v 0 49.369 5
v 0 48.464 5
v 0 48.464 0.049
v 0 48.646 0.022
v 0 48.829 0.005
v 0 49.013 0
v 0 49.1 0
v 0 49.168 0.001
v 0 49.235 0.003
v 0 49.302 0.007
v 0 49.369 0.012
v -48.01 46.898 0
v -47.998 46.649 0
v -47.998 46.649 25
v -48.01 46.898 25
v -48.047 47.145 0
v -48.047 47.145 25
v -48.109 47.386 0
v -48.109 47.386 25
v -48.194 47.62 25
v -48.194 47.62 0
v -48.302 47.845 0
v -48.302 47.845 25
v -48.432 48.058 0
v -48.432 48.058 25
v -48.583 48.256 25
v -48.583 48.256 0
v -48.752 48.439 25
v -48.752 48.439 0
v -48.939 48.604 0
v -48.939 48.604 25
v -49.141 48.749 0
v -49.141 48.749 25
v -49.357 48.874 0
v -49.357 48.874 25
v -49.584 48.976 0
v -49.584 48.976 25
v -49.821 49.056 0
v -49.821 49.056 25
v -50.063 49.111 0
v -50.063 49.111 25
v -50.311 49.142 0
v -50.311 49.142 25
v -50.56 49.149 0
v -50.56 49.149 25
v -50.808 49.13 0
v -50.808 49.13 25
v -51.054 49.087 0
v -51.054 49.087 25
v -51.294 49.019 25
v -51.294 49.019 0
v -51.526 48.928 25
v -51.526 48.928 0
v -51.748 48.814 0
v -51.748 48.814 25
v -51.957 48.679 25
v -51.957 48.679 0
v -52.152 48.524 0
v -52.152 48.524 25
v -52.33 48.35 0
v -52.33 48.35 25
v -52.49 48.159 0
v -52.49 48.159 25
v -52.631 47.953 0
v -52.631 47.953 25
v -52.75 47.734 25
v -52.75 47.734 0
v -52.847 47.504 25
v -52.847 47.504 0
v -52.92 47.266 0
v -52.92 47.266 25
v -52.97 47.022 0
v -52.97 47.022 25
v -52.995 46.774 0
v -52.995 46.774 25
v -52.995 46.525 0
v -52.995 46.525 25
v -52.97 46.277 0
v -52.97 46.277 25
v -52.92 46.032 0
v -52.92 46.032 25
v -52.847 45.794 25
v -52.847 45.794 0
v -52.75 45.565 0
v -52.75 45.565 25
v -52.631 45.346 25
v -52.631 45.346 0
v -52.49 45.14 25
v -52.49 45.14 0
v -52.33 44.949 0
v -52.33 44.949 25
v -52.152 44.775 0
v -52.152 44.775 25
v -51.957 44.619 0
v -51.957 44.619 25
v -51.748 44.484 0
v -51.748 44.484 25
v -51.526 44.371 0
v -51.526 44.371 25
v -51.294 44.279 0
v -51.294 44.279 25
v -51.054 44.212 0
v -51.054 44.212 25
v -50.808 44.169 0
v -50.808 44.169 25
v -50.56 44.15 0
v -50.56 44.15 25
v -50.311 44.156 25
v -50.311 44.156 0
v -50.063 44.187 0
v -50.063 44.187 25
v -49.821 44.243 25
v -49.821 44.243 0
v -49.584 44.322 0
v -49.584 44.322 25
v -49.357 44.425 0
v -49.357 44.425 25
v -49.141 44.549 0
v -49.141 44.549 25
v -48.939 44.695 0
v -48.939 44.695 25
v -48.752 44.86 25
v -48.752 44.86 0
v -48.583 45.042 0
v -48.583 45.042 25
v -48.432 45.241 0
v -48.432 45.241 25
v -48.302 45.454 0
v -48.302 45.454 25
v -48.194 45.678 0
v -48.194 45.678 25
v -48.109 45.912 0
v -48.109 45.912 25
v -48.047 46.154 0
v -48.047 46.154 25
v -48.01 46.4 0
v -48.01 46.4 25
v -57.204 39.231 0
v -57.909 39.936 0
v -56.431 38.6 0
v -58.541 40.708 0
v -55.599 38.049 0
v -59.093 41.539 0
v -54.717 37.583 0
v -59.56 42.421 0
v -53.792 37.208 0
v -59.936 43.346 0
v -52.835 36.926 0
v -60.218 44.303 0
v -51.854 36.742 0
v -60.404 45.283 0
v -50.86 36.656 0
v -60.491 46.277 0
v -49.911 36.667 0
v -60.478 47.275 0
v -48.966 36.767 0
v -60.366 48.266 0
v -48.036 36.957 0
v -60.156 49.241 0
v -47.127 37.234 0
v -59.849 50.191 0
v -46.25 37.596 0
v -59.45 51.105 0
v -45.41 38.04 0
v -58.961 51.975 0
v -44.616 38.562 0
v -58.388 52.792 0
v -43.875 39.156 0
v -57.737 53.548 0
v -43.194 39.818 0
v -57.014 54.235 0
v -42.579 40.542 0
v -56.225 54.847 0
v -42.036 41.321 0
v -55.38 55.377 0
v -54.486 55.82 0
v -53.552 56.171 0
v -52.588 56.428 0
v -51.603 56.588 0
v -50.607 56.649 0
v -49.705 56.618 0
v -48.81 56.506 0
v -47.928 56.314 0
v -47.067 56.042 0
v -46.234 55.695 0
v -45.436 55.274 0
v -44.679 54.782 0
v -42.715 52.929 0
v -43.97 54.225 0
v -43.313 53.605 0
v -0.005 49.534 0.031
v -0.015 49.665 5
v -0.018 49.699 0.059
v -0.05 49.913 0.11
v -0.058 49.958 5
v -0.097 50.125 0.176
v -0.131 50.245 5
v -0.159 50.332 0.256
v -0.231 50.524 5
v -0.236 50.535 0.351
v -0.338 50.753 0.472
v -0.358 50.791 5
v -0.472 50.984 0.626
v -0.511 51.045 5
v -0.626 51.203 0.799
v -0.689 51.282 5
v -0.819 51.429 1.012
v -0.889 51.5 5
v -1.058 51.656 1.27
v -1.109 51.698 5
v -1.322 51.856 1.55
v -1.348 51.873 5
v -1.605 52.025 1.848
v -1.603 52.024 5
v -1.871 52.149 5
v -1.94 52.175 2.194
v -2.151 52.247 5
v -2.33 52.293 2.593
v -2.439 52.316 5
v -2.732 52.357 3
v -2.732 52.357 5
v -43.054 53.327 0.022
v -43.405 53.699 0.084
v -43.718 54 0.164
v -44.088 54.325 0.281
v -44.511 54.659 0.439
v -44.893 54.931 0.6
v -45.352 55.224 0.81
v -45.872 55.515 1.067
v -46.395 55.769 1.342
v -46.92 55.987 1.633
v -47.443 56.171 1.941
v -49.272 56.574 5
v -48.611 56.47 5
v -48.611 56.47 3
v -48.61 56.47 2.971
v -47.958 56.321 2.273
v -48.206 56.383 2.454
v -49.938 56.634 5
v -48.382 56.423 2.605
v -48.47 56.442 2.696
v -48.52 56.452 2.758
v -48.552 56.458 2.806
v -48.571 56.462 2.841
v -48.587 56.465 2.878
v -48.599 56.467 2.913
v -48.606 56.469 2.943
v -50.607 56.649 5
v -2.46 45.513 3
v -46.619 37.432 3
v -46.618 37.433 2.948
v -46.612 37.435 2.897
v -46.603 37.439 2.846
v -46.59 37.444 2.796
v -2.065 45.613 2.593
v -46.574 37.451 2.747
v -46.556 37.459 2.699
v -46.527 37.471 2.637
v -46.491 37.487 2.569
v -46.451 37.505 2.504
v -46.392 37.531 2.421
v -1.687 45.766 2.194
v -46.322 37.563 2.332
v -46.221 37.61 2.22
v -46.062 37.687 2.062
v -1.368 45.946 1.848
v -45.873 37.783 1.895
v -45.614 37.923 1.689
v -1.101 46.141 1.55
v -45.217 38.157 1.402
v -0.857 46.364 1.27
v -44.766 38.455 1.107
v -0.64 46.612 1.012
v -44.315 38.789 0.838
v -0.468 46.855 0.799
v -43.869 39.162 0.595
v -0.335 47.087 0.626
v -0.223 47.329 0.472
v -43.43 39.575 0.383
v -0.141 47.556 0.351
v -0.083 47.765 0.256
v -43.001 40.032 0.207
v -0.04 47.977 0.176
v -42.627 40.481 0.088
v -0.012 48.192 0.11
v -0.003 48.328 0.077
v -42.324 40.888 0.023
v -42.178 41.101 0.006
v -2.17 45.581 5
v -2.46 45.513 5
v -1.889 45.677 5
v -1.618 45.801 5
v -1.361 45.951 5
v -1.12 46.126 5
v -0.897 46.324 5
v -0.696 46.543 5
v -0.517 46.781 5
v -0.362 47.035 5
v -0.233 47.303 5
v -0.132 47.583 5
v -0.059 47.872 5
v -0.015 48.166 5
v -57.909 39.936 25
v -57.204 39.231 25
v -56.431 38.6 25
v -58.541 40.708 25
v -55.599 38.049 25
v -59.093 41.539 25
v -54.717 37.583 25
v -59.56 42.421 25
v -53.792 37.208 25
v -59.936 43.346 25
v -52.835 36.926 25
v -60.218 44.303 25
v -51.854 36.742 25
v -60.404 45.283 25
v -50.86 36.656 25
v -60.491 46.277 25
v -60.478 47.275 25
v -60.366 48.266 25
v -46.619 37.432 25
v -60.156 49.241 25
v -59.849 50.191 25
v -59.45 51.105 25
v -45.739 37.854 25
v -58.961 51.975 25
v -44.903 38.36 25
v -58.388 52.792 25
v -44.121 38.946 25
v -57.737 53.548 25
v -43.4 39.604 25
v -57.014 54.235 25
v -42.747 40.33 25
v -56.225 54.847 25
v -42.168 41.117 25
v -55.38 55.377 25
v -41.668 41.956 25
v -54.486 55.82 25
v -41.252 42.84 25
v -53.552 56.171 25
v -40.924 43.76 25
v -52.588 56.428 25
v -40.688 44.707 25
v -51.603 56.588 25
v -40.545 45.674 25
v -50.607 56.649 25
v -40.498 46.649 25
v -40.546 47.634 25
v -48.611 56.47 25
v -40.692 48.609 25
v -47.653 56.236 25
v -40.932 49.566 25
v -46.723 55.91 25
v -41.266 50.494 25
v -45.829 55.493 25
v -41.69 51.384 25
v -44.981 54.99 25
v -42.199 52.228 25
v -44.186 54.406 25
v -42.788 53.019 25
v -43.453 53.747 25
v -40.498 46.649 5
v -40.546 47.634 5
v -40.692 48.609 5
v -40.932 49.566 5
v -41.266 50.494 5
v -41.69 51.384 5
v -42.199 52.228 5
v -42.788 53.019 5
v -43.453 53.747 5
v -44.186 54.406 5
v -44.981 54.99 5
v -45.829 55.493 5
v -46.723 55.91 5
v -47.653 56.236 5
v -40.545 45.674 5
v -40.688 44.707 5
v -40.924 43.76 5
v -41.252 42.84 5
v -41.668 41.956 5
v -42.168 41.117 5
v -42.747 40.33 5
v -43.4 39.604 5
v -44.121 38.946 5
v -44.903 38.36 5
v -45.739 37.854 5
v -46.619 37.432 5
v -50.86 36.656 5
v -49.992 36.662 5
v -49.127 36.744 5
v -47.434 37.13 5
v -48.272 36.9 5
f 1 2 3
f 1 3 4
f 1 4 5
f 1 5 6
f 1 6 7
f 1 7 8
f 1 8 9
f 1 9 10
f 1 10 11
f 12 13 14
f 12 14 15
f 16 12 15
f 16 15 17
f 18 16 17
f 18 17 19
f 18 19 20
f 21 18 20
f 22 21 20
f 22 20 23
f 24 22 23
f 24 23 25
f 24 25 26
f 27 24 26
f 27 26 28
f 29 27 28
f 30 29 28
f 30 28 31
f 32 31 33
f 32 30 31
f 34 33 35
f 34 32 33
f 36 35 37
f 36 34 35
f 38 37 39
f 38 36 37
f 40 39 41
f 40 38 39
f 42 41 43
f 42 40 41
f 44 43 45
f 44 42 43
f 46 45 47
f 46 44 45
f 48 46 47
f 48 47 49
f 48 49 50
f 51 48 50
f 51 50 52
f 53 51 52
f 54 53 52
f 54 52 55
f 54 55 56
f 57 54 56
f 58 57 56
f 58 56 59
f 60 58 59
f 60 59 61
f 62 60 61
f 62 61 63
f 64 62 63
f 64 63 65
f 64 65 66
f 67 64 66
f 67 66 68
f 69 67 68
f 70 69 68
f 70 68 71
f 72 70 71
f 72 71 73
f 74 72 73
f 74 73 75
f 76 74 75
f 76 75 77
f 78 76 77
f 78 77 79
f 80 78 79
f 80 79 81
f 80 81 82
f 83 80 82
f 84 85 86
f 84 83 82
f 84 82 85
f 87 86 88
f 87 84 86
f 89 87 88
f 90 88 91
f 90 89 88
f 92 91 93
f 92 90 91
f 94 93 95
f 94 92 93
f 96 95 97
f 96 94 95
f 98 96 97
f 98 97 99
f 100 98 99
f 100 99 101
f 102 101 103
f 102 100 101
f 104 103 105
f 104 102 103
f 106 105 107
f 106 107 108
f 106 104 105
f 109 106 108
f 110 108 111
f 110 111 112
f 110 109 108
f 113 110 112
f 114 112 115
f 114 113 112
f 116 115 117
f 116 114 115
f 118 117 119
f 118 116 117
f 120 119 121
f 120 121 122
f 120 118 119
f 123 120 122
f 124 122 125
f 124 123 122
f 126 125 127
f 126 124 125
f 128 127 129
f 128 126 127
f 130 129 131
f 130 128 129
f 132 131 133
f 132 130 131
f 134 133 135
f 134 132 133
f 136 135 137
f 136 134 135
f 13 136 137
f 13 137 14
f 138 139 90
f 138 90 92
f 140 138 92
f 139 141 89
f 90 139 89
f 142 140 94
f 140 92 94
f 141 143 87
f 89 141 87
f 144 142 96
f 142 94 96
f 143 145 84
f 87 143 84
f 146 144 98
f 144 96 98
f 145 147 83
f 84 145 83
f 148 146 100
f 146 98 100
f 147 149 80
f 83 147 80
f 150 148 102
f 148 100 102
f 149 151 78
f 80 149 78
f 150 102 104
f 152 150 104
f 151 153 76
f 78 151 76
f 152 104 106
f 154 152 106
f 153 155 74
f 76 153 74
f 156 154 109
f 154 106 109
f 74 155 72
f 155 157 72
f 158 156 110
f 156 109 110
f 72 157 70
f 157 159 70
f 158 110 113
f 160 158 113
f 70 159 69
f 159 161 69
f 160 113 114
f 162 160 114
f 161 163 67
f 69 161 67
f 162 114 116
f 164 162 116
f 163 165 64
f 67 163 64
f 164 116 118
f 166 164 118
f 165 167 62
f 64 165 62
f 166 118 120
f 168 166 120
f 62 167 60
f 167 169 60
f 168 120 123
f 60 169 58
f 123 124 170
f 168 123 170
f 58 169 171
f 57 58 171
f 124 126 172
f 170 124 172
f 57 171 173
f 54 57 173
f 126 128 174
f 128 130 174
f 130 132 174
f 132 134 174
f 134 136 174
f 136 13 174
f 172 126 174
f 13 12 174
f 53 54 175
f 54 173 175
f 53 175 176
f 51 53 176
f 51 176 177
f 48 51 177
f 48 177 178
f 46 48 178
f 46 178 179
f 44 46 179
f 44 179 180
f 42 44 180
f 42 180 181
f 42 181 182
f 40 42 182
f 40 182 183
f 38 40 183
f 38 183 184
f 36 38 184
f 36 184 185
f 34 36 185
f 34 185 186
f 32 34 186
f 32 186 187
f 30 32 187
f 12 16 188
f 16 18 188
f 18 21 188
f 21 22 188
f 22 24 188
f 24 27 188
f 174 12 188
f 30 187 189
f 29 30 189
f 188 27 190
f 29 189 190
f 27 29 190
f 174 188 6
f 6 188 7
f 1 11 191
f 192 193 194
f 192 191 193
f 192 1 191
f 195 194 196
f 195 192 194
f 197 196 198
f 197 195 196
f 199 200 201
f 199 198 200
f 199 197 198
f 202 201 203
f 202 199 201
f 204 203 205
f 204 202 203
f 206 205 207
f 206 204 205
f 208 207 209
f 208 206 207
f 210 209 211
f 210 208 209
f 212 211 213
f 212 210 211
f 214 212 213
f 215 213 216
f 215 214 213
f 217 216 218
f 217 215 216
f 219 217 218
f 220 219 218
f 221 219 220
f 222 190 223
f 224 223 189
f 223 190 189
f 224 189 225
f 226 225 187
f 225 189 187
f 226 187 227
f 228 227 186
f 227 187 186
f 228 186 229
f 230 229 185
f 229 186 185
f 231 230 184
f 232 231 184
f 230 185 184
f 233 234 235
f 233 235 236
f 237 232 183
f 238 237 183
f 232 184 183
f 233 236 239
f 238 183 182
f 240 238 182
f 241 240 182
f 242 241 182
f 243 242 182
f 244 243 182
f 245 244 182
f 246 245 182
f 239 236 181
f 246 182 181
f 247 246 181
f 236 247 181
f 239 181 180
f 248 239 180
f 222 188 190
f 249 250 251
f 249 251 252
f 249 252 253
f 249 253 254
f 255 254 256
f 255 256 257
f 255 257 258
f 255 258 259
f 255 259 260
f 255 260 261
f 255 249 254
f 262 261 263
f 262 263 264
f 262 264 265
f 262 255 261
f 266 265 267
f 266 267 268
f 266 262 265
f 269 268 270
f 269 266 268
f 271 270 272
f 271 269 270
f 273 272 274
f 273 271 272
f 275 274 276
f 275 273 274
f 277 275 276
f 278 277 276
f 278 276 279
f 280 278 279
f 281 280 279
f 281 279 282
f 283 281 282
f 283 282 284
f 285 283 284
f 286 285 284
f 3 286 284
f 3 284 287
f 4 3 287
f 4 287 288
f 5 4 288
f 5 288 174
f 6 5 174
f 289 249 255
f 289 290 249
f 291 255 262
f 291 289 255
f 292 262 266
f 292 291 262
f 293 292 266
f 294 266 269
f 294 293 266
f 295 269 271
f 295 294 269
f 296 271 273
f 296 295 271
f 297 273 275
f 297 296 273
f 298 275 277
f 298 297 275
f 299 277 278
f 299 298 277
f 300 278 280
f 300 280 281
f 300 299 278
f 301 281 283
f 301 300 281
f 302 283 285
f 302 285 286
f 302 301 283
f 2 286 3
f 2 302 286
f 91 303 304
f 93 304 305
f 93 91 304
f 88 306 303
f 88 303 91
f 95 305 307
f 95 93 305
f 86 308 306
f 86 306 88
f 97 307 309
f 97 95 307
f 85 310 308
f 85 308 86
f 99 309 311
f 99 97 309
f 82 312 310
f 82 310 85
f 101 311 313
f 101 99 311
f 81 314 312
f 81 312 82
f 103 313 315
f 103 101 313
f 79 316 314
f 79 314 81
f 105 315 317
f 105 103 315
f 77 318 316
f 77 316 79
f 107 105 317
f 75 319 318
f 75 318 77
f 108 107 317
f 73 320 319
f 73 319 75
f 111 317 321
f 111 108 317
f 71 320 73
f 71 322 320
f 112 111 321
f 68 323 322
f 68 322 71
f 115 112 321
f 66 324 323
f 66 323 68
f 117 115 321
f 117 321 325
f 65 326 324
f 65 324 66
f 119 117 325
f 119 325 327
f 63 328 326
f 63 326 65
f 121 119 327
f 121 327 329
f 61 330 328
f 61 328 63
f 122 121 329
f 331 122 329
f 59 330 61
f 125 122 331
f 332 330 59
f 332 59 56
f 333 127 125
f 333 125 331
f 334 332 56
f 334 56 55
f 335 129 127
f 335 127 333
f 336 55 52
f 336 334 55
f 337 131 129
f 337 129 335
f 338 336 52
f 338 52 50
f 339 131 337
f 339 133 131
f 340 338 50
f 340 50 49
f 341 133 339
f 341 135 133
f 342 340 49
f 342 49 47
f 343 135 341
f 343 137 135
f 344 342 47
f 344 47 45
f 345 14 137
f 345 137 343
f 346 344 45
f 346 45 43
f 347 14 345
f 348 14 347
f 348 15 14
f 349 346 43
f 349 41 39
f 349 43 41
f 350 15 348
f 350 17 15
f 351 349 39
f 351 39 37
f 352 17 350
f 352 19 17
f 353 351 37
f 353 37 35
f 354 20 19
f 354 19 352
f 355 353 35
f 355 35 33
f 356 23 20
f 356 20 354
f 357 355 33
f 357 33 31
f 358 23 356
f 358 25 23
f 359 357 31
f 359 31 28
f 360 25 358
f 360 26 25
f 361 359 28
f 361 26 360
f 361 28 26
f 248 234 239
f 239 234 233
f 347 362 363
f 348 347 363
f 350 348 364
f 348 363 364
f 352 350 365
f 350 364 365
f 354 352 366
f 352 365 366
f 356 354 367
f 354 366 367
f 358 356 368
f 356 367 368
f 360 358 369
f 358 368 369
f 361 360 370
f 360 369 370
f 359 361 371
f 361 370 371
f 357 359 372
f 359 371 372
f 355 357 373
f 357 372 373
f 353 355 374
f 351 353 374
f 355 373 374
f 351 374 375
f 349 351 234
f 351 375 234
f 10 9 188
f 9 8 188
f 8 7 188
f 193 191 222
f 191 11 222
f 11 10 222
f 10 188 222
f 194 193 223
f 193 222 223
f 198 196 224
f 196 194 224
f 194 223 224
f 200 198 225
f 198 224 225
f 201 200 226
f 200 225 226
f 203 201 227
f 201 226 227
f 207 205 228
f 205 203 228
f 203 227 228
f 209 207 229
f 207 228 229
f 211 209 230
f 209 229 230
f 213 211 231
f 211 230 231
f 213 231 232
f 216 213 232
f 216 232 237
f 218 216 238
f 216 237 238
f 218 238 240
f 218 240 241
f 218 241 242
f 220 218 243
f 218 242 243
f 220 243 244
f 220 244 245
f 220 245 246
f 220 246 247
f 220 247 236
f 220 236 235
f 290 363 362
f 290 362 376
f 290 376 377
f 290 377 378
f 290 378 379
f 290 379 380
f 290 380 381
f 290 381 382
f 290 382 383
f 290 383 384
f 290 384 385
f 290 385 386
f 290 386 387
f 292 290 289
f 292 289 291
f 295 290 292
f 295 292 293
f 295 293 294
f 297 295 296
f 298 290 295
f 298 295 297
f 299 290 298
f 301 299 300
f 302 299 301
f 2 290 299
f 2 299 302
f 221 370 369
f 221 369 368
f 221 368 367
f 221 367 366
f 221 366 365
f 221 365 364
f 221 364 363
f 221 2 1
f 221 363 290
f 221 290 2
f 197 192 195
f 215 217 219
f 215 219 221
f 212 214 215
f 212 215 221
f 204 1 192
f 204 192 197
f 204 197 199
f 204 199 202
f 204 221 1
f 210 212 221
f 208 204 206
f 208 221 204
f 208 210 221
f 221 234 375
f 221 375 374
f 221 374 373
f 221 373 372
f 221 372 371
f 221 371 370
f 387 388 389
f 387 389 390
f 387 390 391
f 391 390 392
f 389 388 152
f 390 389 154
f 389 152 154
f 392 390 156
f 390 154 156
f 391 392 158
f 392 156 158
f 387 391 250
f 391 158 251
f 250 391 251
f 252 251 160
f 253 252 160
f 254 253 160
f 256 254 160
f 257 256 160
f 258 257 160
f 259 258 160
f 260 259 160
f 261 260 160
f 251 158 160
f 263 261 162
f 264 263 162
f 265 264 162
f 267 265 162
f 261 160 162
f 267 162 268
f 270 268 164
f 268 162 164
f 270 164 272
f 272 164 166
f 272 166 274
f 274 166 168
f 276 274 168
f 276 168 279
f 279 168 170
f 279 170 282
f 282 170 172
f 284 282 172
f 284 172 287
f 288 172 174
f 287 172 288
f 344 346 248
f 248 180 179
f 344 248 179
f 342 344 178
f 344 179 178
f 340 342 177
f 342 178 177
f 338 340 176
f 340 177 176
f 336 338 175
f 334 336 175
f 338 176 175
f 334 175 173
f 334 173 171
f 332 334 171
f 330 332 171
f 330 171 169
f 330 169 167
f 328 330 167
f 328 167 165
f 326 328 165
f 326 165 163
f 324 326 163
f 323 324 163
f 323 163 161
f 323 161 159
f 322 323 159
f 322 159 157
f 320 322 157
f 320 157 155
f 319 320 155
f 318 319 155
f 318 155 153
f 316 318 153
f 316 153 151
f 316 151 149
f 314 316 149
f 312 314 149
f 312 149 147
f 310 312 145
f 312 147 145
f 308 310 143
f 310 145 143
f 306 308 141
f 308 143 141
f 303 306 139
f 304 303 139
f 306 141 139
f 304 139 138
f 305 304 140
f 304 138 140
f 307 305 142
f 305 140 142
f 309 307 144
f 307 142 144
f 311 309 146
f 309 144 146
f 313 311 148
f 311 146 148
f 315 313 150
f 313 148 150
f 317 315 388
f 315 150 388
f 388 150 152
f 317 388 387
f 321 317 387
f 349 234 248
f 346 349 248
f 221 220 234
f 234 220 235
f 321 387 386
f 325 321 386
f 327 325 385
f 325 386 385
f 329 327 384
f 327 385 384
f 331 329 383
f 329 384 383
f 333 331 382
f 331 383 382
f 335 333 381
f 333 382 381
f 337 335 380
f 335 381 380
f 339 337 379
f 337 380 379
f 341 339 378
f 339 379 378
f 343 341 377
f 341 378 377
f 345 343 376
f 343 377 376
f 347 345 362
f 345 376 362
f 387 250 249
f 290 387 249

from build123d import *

# Parameters (mm, degrees)
F0_R     = 2.5
F1_DEPTH = 25
F2_DEPTH = 5
F3_R     = 3


with BuildPart() as f1:
    # F0 (on Top) → F1 (new body)
    with BuildSketch(Plane.XY):
        with BuildLine():
            Line((-48.6113993327, 56.4697863751), (-50.6071856175, 56.6486881103))
            ThreePointArc((-50.6071856175, 56.6486881103), (-60.4968157511, 46.7759208686), (-50.8603799334, 36.6558703788))
            Line((-50.8603799334, 36.6558703788), (-46.6194621468, 37.431918344))
            ThreePointArc((-46.6194621468, 37.431918344), (-42.1675049005, 41.1167281405), (-40.4976175725, 46.6492883861))
            ThreePointArc((-40.4976175725, 46.6492883861), (-42.7884612504, 53.0186611025), (-48.6113993327, 56.4697863751))
        make_face()
        with Locations((-50.4976175725, 46.6492883861)):
            Circle(F0_R, mode=Mode.SUBTRACT)
    extrude(amount=F1_DEPTH)

    # F0 (on Top) → F2 (join)
    with BuildSketch(Plane.XY):
        with BuildLine():
            Line((-48.6113993327, 56.4697863751), (-50.6071856175, 56.6486881103))
            ThreePointArc((-50.6071856175, 56.6486881103), (-60.4968157511, 46.7759208686), (-50.8603799334, 36.6558703788))
            Line((-50.8603799334, 36.6558703788), (-46.6194621468, 37.431918344))
            ThreePointArc((-46.6194621468, 37.431918344), (-42.1675049005, 41.1167281405), (-40.4976175725, 46.6492883861))
            ThreePointArc((-40.4976175725, 46.6492883861), (-42.7884612504, 53.0186611025), (-48.6113993327, 56.4697863751))
        make_face()
        with Locations((-50.4976175725, 46.6492883861)):
            Circle(F0_R, mode=Mode.SUBTRACT)
        with BuildLine():
            ThreePointArc((-48.6113993327, 56.4697863751), (-49.6048001576, 56.6093524955), (-50.6071856175, 56.6486881103))
            Line((-50.6071856175, 56.6486881103), (-48.6113993327, 56.4697863751))
        make_face()
        with BuildLine():
            Line((-46.6194621468, 37.431918344), (-50.8603799334, 36.6558703788))
            ThreePointArc((-50.8603799334, 36.6558703788), (-48.6976009861, 36.8126253194), (-46.6194621468, 37.431918344))
        make_face()
        with BuildLine():
            Line((0, 52.1122738719), (-48.6113993327, 56.4697863751))
            ThreePointArc((-48.6113993327, 56.4697863751), (-42.7884612504, 53.0186611025), (-40.4976175725, 46.6492883861))
            ThreePointArc((-40.4976175725, 46.6492883861), (-42.1675049005, 41.1167281405), (-46.6194621468, 37.431918344))
            Line((-46.6194621468, 37.431918344), (0, 45.9628403187))
            Line((0, 45.9628403187), (0, 52.1122738719))
        make_face()
    extrude(amount=F2_DEPTH)

    # F3
    f3_edges = [f1.edges().sort_by_distance(p)[0] for p in [
        (0, 45.96284, 2.5),
        (0, 52.112274, 2.5),
        (-23.309731, 41.697379, 0),
        (-24.3057, 54.29103, 0),
    ]]
    fillet(f3_edges, radius=F3_R)


solid = f1.part
